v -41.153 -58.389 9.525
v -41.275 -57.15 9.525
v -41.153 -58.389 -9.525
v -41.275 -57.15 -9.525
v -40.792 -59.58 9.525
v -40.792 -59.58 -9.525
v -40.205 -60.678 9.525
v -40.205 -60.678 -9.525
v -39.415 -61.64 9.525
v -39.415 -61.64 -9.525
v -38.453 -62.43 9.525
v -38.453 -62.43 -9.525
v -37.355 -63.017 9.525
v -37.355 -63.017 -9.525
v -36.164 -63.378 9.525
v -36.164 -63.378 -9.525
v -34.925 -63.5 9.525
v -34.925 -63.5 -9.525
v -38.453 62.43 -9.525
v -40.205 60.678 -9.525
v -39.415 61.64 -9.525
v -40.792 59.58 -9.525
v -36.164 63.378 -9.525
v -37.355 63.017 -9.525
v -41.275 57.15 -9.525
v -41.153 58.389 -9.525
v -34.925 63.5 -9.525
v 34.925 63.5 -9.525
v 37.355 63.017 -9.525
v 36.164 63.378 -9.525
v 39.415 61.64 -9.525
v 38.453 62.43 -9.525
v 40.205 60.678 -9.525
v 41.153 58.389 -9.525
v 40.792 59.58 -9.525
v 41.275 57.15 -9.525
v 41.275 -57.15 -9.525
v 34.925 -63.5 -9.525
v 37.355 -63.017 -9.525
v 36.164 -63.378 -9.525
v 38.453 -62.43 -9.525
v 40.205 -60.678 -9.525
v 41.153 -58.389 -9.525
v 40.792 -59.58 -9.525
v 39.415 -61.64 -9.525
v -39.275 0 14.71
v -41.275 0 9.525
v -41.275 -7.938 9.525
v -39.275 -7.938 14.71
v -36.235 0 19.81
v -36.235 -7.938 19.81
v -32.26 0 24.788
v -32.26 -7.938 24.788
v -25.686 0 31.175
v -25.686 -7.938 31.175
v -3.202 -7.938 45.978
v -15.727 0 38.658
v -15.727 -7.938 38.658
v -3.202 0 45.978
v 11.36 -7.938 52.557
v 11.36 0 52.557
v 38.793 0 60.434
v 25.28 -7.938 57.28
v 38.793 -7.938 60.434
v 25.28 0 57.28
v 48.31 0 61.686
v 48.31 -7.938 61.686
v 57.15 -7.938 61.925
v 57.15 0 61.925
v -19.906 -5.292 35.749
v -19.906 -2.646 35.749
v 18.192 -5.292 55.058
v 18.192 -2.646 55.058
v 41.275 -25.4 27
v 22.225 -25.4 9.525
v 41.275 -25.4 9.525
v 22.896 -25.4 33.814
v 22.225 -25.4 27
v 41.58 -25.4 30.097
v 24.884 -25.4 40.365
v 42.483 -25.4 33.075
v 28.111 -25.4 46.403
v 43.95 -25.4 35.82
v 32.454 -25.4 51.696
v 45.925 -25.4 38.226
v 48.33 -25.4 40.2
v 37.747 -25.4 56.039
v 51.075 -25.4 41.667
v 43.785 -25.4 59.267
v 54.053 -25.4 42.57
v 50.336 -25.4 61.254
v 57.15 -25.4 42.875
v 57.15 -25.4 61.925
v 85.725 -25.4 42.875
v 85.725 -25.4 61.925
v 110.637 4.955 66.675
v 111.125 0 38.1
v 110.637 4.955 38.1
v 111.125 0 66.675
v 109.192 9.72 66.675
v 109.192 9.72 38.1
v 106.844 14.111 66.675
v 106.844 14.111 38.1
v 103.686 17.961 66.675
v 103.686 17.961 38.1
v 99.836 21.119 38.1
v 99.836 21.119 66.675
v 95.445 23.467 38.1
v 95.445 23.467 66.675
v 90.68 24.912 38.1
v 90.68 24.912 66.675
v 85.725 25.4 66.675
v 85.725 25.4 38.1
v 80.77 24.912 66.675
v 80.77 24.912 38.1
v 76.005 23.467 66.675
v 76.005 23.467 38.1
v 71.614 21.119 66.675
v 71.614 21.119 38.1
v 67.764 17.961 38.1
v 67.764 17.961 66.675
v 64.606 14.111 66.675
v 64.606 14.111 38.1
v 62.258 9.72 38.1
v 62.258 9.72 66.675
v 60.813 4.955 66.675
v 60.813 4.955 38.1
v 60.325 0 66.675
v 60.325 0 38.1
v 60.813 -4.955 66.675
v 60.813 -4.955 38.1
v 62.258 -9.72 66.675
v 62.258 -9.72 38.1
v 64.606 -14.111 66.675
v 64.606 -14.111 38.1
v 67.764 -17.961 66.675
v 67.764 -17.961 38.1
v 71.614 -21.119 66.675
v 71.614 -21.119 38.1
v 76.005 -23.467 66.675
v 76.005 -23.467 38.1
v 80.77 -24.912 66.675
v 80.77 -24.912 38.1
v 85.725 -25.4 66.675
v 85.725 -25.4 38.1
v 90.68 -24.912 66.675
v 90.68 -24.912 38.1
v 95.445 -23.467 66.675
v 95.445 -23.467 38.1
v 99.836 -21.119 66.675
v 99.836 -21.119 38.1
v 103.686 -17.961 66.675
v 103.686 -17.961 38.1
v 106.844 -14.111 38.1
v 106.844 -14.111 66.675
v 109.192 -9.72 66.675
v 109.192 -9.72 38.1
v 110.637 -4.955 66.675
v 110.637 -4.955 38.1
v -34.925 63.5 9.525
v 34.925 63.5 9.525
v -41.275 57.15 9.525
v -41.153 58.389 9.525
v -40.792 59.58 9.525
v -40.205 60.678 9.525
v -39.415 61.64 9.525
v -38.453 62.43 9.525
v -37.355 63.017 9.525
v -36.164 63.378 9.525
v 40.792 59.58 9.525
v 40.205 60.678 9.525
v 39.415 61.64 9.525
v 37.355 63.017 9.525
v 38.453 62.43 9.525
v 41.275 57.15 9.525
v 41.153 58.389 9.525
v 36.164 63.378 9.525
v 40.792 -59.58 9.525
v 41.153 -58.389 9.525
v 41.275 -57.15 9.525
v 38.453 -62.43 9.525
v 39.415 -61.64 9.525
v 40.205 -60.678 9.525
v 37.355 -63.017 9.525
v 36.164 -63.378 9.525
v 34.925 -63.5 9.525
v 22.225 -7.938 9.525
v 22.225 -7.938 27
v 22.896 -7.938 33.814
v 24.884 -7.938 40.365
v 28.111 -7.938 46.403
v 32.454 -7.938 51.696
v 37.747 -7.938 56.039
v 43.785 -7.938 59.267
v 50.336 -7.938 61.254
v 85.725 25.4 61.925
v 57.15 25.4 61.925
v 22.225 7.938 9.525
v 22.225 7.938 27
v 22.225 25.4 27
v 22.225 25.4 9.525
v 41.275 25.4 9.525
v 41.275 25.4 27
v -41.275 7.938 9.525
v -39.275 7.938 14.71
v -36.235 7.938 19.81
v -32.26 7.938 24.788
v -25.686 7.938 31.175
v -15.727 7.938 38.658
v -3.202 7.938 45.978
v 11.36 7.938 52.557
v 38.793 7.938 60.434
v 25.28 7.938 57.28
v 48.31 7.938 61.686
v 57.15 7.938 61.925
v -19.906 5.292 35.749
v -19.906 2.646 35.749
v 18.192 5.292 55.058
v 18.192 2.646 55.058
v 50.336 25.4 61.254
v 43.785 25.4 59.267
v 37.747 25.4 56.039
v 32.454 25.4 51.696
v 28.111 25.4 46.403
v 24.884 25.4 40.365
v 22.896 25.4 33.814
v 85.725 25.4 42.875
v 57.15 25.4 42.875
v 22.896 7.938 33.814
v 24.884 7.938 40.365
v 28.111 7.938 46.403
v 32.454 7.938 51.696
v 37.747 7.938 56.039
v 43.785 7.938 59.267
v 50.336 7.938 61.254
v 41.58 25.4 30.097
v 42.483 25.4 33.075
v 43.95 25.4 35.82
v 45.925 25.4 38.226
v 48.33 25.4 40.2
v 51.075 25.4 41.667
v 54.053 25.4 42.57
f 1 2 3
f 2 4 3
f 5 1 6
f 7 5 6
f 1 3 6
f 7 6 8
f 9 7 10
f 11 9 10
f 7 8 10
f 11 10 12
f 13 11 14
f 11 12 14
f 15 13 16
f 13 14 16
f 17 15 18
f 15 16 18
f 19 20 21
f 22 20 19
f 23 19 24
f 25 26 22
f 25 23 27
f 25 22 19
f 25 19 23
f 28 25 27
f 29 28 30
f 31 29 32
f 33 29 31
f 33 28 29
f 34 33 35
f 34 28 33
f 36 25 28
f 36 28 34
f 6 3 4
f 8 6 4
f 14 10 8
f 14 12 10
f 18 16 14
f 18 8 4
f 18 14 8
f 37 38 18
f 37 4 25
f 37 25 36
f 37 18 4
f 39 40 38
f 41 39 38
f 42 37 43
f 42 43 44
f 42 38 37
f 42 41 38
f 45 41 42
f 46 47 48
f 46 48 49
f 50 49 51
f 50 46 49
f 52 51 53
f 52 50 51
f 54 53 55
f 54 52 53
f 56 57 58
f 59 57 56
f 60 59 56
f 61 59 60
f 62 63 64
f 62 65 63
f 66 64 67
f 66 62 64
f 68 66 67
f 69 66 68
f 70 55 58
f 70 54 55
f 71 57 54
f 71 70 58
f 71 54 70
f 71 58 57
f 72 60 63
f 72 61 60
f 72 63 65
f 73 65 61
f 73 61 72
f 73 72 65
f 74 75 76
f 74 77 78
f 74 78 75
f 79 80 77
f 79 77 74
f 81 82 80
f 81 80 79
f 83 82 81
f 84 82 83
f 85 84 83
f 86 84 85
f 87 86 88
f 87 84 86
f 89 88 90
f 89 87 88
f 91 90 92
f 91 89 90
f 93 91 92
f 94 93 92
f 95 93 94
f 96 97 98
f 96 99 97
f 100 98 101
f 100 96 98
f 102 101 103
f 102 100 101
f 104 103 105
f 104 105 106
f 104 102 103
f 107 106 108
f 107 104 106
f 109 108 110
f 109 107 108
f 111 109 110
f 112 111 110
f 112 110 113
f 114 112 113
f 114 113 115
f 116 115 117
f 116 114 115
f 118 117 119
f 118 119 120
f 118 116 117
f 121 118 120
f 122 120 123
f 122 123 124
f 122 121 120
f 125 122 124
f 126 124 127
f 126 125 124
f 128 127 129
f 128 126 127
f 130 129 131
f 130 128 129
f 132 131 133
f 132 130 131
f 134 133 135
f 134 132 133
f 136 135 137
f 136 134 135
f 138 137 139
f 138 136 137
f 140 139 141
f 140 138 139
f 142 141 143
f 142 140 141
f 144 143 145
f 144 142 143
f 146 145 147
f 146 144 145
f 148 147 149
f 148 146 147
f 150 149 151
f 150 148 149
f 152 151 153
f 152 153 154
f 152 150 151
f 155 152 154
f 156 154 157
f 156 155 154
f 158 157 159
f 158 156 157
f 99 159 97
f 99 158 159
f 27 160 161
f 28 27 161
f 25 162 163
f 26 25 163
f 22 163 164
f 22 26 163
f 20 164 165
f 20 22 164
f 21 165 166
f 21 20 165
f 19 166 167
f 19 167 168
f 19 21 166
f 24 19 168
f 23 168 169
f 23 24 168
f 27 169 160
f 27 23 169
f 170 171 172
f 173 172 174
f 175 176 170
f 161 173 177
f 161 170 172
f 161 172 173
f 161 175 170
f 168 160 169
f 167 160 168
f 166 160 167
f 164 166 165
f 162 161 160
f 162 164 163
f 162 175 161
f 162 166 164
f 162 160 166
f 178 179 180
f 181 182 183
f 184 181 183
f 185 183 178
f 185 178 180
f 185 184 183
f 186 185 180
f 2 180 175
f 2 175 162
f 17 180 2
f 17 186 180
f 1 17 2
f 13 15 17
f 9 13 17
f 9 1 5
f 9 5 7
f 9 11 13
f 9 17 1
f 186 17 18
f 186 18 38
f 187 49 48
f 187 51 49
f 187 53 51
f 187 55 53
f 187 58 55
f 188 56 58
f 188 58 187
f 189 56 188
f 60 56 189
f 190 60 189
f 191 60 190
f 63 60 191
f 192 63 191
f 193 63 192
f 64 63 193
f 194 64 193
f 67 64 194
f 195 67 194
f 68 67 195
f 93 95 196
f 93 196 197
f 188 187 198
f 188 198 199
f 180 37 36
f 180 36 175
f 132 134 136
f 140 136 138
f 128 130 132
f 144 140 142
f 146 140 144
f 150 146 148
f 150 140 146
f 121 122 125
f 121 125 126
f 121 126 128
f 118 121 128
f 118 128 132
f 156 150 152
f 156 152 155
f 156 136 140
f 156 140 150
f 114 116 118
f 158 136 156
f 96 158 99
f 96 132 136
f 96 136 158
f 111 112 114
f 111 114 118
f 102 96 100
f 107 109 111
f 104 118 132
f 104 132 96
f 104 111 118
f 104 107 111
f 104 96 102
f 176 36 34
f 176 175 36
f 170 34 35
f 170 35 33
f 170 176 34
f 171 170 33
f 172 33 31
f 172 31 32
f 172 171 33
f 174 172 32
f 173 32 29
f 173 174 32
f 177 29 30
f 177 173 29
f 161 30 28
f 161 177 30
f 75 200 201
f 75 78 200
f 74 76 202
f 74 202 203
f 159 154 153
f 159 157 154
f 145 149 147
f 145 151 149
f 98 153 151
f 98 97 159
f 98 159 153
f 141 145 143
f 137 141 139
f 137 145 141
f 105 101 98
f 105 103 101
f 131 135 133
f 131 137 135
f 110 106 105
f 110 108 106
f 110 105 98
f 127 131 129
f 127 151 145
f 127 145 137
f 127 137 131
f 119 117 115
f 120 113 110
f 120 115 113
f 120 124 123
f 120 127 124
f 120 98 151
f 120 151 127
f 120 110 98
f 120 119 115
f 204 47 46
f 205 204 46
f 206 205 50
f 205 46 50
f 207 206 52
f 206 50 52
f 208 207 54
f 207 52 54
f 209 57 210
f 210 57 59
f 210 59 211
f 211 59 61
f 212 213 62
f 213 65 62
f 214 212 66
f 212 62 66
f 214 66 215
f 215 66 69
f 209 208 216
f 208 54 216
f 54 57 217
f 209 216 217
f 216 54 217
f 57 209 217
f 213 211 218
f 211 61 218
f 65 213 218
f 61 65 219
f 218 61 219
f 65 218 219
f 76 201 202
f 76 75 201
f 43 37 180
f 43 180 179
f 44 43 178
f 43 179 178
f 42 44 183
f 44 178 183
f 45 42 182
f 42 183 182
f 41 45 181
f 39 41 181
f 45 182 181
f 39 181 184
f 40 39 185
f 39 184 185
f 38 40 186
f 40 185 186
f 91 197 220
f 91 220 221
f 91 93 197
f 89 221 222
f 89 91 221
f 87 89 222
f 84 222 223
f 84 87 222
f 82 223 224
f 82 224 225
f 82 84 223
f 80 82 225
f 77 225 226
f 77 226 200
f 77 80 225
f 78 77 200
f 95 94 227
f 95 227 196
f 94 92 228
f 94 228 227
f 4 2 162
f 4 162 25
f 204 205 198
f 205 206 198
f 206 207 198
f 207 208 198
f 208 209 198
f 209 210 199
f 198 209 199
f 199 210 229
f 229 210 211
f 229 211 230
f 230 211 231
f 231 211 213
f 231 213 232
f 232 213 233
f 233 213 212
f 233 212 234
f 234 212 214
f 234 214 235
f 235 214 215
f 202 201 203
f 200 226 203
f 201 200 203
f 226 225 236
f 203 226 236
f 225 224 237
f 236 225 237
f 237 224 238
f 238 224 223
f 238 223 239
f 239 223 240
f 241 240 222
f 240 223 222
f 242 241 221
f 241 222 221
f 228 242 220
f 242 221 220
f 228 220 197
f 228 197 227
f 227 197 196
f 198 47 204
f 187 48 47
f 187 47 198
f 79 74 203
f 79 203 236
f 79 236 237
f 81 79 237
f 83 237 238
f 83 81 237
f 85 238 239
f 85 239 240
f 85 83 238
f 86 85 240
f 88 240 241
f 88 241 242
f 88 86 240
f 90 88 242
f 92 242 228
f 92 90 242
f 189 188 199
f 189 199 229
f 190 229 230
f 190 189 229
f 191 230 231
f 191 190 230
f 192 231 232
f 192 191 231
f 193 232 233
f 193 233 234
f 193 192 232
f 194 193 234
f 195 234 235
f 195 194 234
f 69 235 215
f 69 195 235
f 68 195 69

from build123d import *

# Parameters (mm, degrees)
F1_DEPTH = 63.5
F0_W     = 25.4
F0_H     = 19.05
F2_DEPTH = 25.4
F3_DEPTH = 7.9375
F5_R     = 6.35


with BuildPart() as f1:
    # F0 (on Front) → F1 (new body, symmetric)
    with BuildSketch(Plane.XZ):
        Polygon((41.275, -9.525), (41.275, 9.525), (22.225, 9.525), (-41.275, 9.525), (-41.275, -9.525), align=None)
    extrude(amount=F1_DEPTH, both=True)

    # F5
    f5_edges = [f1.edges().sort_by_distance(p)[0] for p in [
        (-41.275, -63.5, 0),
        (41.275, -63.5, 0),
        (-41.275, 63.5, 0),
        (41.275, 63.5, 0),
    ]]
    fillet(f5_edges, radius=F5_R)


with BuildPart() as f2:
    # F0 (on Front) → F2 (new body, symmetric)
    with BuildSketch(Plane.XZ):
        with BuildLine():
            Line((22.225, 9.525), (41.275, 9.525))
            Line((41.275, 9.525), (41.275, 27.0002))
            ThreePointArc((41.275, 27.0002), (45.9246798487, 38.2255201513), (57.15, 42.8752))
            Line((57.15, 42.8752), (60.325, 42.8752))
            Line((60.325, 42.8752), (60.325, 61.9252))
            Line((60.325, 61.9252), (57.15, 61.9252))
            ThreePointArc((57.15, 61.9252), (32.4542956671, 51.6959043329), (22.225, 27.0002))
            Line((22.225, 27.0002), (22.225, 9.525))
        make_face()
        with Locations((73.025, 52.4002)):
            Rectangle(F0_W, F0_H)
    extrude(amount=F2_DEPTH, both=True)


with BuildPart() as f3:
    # F0 (on Front) → F3 (new body, symmetric)
    with BuildSketch(Plane.XZ):
        with BuildLine():
            Line((-41.275, 9.525), (22.225, 9.525))
            Line((22.225, 9.525), (22.225, 27.0002))
            ThreePointArc((22.225, 27.0002), (32.4542956671, 51.6959043329), (57.15, 61.9252))
            add(Edge.make_bspline(
                [(-41.275, 9.525), (-33.5592367287, 37.3656127197), (23.0512869774, 63.119604878), (57.15, 61.9252)],
                knots=[0, 0, 0, 0, 111.5045361635, 111.5045361635, 111.5045361635, 111.5045361635], degree=3))
        make_face()
    extrude(amount=F3_DEPTH, both=True)


with BuildPart() as f4:
    # F0 (on Front) → F4 (revolve)
    with BuildSketch(Plane.XZ):
        Polygon((85.725, 61.9252), (85.725, 42.8752), (85.725, 38.1), (111.125, 38.1), (111.125, 66.675), (85.725, 66.675), align=None)
    revolve(axis=Axis((85.725, 0, 52.3875), (0, 0, 1)))


solid = Compound([f1.part, f2.part, f3.part, f4.part])
